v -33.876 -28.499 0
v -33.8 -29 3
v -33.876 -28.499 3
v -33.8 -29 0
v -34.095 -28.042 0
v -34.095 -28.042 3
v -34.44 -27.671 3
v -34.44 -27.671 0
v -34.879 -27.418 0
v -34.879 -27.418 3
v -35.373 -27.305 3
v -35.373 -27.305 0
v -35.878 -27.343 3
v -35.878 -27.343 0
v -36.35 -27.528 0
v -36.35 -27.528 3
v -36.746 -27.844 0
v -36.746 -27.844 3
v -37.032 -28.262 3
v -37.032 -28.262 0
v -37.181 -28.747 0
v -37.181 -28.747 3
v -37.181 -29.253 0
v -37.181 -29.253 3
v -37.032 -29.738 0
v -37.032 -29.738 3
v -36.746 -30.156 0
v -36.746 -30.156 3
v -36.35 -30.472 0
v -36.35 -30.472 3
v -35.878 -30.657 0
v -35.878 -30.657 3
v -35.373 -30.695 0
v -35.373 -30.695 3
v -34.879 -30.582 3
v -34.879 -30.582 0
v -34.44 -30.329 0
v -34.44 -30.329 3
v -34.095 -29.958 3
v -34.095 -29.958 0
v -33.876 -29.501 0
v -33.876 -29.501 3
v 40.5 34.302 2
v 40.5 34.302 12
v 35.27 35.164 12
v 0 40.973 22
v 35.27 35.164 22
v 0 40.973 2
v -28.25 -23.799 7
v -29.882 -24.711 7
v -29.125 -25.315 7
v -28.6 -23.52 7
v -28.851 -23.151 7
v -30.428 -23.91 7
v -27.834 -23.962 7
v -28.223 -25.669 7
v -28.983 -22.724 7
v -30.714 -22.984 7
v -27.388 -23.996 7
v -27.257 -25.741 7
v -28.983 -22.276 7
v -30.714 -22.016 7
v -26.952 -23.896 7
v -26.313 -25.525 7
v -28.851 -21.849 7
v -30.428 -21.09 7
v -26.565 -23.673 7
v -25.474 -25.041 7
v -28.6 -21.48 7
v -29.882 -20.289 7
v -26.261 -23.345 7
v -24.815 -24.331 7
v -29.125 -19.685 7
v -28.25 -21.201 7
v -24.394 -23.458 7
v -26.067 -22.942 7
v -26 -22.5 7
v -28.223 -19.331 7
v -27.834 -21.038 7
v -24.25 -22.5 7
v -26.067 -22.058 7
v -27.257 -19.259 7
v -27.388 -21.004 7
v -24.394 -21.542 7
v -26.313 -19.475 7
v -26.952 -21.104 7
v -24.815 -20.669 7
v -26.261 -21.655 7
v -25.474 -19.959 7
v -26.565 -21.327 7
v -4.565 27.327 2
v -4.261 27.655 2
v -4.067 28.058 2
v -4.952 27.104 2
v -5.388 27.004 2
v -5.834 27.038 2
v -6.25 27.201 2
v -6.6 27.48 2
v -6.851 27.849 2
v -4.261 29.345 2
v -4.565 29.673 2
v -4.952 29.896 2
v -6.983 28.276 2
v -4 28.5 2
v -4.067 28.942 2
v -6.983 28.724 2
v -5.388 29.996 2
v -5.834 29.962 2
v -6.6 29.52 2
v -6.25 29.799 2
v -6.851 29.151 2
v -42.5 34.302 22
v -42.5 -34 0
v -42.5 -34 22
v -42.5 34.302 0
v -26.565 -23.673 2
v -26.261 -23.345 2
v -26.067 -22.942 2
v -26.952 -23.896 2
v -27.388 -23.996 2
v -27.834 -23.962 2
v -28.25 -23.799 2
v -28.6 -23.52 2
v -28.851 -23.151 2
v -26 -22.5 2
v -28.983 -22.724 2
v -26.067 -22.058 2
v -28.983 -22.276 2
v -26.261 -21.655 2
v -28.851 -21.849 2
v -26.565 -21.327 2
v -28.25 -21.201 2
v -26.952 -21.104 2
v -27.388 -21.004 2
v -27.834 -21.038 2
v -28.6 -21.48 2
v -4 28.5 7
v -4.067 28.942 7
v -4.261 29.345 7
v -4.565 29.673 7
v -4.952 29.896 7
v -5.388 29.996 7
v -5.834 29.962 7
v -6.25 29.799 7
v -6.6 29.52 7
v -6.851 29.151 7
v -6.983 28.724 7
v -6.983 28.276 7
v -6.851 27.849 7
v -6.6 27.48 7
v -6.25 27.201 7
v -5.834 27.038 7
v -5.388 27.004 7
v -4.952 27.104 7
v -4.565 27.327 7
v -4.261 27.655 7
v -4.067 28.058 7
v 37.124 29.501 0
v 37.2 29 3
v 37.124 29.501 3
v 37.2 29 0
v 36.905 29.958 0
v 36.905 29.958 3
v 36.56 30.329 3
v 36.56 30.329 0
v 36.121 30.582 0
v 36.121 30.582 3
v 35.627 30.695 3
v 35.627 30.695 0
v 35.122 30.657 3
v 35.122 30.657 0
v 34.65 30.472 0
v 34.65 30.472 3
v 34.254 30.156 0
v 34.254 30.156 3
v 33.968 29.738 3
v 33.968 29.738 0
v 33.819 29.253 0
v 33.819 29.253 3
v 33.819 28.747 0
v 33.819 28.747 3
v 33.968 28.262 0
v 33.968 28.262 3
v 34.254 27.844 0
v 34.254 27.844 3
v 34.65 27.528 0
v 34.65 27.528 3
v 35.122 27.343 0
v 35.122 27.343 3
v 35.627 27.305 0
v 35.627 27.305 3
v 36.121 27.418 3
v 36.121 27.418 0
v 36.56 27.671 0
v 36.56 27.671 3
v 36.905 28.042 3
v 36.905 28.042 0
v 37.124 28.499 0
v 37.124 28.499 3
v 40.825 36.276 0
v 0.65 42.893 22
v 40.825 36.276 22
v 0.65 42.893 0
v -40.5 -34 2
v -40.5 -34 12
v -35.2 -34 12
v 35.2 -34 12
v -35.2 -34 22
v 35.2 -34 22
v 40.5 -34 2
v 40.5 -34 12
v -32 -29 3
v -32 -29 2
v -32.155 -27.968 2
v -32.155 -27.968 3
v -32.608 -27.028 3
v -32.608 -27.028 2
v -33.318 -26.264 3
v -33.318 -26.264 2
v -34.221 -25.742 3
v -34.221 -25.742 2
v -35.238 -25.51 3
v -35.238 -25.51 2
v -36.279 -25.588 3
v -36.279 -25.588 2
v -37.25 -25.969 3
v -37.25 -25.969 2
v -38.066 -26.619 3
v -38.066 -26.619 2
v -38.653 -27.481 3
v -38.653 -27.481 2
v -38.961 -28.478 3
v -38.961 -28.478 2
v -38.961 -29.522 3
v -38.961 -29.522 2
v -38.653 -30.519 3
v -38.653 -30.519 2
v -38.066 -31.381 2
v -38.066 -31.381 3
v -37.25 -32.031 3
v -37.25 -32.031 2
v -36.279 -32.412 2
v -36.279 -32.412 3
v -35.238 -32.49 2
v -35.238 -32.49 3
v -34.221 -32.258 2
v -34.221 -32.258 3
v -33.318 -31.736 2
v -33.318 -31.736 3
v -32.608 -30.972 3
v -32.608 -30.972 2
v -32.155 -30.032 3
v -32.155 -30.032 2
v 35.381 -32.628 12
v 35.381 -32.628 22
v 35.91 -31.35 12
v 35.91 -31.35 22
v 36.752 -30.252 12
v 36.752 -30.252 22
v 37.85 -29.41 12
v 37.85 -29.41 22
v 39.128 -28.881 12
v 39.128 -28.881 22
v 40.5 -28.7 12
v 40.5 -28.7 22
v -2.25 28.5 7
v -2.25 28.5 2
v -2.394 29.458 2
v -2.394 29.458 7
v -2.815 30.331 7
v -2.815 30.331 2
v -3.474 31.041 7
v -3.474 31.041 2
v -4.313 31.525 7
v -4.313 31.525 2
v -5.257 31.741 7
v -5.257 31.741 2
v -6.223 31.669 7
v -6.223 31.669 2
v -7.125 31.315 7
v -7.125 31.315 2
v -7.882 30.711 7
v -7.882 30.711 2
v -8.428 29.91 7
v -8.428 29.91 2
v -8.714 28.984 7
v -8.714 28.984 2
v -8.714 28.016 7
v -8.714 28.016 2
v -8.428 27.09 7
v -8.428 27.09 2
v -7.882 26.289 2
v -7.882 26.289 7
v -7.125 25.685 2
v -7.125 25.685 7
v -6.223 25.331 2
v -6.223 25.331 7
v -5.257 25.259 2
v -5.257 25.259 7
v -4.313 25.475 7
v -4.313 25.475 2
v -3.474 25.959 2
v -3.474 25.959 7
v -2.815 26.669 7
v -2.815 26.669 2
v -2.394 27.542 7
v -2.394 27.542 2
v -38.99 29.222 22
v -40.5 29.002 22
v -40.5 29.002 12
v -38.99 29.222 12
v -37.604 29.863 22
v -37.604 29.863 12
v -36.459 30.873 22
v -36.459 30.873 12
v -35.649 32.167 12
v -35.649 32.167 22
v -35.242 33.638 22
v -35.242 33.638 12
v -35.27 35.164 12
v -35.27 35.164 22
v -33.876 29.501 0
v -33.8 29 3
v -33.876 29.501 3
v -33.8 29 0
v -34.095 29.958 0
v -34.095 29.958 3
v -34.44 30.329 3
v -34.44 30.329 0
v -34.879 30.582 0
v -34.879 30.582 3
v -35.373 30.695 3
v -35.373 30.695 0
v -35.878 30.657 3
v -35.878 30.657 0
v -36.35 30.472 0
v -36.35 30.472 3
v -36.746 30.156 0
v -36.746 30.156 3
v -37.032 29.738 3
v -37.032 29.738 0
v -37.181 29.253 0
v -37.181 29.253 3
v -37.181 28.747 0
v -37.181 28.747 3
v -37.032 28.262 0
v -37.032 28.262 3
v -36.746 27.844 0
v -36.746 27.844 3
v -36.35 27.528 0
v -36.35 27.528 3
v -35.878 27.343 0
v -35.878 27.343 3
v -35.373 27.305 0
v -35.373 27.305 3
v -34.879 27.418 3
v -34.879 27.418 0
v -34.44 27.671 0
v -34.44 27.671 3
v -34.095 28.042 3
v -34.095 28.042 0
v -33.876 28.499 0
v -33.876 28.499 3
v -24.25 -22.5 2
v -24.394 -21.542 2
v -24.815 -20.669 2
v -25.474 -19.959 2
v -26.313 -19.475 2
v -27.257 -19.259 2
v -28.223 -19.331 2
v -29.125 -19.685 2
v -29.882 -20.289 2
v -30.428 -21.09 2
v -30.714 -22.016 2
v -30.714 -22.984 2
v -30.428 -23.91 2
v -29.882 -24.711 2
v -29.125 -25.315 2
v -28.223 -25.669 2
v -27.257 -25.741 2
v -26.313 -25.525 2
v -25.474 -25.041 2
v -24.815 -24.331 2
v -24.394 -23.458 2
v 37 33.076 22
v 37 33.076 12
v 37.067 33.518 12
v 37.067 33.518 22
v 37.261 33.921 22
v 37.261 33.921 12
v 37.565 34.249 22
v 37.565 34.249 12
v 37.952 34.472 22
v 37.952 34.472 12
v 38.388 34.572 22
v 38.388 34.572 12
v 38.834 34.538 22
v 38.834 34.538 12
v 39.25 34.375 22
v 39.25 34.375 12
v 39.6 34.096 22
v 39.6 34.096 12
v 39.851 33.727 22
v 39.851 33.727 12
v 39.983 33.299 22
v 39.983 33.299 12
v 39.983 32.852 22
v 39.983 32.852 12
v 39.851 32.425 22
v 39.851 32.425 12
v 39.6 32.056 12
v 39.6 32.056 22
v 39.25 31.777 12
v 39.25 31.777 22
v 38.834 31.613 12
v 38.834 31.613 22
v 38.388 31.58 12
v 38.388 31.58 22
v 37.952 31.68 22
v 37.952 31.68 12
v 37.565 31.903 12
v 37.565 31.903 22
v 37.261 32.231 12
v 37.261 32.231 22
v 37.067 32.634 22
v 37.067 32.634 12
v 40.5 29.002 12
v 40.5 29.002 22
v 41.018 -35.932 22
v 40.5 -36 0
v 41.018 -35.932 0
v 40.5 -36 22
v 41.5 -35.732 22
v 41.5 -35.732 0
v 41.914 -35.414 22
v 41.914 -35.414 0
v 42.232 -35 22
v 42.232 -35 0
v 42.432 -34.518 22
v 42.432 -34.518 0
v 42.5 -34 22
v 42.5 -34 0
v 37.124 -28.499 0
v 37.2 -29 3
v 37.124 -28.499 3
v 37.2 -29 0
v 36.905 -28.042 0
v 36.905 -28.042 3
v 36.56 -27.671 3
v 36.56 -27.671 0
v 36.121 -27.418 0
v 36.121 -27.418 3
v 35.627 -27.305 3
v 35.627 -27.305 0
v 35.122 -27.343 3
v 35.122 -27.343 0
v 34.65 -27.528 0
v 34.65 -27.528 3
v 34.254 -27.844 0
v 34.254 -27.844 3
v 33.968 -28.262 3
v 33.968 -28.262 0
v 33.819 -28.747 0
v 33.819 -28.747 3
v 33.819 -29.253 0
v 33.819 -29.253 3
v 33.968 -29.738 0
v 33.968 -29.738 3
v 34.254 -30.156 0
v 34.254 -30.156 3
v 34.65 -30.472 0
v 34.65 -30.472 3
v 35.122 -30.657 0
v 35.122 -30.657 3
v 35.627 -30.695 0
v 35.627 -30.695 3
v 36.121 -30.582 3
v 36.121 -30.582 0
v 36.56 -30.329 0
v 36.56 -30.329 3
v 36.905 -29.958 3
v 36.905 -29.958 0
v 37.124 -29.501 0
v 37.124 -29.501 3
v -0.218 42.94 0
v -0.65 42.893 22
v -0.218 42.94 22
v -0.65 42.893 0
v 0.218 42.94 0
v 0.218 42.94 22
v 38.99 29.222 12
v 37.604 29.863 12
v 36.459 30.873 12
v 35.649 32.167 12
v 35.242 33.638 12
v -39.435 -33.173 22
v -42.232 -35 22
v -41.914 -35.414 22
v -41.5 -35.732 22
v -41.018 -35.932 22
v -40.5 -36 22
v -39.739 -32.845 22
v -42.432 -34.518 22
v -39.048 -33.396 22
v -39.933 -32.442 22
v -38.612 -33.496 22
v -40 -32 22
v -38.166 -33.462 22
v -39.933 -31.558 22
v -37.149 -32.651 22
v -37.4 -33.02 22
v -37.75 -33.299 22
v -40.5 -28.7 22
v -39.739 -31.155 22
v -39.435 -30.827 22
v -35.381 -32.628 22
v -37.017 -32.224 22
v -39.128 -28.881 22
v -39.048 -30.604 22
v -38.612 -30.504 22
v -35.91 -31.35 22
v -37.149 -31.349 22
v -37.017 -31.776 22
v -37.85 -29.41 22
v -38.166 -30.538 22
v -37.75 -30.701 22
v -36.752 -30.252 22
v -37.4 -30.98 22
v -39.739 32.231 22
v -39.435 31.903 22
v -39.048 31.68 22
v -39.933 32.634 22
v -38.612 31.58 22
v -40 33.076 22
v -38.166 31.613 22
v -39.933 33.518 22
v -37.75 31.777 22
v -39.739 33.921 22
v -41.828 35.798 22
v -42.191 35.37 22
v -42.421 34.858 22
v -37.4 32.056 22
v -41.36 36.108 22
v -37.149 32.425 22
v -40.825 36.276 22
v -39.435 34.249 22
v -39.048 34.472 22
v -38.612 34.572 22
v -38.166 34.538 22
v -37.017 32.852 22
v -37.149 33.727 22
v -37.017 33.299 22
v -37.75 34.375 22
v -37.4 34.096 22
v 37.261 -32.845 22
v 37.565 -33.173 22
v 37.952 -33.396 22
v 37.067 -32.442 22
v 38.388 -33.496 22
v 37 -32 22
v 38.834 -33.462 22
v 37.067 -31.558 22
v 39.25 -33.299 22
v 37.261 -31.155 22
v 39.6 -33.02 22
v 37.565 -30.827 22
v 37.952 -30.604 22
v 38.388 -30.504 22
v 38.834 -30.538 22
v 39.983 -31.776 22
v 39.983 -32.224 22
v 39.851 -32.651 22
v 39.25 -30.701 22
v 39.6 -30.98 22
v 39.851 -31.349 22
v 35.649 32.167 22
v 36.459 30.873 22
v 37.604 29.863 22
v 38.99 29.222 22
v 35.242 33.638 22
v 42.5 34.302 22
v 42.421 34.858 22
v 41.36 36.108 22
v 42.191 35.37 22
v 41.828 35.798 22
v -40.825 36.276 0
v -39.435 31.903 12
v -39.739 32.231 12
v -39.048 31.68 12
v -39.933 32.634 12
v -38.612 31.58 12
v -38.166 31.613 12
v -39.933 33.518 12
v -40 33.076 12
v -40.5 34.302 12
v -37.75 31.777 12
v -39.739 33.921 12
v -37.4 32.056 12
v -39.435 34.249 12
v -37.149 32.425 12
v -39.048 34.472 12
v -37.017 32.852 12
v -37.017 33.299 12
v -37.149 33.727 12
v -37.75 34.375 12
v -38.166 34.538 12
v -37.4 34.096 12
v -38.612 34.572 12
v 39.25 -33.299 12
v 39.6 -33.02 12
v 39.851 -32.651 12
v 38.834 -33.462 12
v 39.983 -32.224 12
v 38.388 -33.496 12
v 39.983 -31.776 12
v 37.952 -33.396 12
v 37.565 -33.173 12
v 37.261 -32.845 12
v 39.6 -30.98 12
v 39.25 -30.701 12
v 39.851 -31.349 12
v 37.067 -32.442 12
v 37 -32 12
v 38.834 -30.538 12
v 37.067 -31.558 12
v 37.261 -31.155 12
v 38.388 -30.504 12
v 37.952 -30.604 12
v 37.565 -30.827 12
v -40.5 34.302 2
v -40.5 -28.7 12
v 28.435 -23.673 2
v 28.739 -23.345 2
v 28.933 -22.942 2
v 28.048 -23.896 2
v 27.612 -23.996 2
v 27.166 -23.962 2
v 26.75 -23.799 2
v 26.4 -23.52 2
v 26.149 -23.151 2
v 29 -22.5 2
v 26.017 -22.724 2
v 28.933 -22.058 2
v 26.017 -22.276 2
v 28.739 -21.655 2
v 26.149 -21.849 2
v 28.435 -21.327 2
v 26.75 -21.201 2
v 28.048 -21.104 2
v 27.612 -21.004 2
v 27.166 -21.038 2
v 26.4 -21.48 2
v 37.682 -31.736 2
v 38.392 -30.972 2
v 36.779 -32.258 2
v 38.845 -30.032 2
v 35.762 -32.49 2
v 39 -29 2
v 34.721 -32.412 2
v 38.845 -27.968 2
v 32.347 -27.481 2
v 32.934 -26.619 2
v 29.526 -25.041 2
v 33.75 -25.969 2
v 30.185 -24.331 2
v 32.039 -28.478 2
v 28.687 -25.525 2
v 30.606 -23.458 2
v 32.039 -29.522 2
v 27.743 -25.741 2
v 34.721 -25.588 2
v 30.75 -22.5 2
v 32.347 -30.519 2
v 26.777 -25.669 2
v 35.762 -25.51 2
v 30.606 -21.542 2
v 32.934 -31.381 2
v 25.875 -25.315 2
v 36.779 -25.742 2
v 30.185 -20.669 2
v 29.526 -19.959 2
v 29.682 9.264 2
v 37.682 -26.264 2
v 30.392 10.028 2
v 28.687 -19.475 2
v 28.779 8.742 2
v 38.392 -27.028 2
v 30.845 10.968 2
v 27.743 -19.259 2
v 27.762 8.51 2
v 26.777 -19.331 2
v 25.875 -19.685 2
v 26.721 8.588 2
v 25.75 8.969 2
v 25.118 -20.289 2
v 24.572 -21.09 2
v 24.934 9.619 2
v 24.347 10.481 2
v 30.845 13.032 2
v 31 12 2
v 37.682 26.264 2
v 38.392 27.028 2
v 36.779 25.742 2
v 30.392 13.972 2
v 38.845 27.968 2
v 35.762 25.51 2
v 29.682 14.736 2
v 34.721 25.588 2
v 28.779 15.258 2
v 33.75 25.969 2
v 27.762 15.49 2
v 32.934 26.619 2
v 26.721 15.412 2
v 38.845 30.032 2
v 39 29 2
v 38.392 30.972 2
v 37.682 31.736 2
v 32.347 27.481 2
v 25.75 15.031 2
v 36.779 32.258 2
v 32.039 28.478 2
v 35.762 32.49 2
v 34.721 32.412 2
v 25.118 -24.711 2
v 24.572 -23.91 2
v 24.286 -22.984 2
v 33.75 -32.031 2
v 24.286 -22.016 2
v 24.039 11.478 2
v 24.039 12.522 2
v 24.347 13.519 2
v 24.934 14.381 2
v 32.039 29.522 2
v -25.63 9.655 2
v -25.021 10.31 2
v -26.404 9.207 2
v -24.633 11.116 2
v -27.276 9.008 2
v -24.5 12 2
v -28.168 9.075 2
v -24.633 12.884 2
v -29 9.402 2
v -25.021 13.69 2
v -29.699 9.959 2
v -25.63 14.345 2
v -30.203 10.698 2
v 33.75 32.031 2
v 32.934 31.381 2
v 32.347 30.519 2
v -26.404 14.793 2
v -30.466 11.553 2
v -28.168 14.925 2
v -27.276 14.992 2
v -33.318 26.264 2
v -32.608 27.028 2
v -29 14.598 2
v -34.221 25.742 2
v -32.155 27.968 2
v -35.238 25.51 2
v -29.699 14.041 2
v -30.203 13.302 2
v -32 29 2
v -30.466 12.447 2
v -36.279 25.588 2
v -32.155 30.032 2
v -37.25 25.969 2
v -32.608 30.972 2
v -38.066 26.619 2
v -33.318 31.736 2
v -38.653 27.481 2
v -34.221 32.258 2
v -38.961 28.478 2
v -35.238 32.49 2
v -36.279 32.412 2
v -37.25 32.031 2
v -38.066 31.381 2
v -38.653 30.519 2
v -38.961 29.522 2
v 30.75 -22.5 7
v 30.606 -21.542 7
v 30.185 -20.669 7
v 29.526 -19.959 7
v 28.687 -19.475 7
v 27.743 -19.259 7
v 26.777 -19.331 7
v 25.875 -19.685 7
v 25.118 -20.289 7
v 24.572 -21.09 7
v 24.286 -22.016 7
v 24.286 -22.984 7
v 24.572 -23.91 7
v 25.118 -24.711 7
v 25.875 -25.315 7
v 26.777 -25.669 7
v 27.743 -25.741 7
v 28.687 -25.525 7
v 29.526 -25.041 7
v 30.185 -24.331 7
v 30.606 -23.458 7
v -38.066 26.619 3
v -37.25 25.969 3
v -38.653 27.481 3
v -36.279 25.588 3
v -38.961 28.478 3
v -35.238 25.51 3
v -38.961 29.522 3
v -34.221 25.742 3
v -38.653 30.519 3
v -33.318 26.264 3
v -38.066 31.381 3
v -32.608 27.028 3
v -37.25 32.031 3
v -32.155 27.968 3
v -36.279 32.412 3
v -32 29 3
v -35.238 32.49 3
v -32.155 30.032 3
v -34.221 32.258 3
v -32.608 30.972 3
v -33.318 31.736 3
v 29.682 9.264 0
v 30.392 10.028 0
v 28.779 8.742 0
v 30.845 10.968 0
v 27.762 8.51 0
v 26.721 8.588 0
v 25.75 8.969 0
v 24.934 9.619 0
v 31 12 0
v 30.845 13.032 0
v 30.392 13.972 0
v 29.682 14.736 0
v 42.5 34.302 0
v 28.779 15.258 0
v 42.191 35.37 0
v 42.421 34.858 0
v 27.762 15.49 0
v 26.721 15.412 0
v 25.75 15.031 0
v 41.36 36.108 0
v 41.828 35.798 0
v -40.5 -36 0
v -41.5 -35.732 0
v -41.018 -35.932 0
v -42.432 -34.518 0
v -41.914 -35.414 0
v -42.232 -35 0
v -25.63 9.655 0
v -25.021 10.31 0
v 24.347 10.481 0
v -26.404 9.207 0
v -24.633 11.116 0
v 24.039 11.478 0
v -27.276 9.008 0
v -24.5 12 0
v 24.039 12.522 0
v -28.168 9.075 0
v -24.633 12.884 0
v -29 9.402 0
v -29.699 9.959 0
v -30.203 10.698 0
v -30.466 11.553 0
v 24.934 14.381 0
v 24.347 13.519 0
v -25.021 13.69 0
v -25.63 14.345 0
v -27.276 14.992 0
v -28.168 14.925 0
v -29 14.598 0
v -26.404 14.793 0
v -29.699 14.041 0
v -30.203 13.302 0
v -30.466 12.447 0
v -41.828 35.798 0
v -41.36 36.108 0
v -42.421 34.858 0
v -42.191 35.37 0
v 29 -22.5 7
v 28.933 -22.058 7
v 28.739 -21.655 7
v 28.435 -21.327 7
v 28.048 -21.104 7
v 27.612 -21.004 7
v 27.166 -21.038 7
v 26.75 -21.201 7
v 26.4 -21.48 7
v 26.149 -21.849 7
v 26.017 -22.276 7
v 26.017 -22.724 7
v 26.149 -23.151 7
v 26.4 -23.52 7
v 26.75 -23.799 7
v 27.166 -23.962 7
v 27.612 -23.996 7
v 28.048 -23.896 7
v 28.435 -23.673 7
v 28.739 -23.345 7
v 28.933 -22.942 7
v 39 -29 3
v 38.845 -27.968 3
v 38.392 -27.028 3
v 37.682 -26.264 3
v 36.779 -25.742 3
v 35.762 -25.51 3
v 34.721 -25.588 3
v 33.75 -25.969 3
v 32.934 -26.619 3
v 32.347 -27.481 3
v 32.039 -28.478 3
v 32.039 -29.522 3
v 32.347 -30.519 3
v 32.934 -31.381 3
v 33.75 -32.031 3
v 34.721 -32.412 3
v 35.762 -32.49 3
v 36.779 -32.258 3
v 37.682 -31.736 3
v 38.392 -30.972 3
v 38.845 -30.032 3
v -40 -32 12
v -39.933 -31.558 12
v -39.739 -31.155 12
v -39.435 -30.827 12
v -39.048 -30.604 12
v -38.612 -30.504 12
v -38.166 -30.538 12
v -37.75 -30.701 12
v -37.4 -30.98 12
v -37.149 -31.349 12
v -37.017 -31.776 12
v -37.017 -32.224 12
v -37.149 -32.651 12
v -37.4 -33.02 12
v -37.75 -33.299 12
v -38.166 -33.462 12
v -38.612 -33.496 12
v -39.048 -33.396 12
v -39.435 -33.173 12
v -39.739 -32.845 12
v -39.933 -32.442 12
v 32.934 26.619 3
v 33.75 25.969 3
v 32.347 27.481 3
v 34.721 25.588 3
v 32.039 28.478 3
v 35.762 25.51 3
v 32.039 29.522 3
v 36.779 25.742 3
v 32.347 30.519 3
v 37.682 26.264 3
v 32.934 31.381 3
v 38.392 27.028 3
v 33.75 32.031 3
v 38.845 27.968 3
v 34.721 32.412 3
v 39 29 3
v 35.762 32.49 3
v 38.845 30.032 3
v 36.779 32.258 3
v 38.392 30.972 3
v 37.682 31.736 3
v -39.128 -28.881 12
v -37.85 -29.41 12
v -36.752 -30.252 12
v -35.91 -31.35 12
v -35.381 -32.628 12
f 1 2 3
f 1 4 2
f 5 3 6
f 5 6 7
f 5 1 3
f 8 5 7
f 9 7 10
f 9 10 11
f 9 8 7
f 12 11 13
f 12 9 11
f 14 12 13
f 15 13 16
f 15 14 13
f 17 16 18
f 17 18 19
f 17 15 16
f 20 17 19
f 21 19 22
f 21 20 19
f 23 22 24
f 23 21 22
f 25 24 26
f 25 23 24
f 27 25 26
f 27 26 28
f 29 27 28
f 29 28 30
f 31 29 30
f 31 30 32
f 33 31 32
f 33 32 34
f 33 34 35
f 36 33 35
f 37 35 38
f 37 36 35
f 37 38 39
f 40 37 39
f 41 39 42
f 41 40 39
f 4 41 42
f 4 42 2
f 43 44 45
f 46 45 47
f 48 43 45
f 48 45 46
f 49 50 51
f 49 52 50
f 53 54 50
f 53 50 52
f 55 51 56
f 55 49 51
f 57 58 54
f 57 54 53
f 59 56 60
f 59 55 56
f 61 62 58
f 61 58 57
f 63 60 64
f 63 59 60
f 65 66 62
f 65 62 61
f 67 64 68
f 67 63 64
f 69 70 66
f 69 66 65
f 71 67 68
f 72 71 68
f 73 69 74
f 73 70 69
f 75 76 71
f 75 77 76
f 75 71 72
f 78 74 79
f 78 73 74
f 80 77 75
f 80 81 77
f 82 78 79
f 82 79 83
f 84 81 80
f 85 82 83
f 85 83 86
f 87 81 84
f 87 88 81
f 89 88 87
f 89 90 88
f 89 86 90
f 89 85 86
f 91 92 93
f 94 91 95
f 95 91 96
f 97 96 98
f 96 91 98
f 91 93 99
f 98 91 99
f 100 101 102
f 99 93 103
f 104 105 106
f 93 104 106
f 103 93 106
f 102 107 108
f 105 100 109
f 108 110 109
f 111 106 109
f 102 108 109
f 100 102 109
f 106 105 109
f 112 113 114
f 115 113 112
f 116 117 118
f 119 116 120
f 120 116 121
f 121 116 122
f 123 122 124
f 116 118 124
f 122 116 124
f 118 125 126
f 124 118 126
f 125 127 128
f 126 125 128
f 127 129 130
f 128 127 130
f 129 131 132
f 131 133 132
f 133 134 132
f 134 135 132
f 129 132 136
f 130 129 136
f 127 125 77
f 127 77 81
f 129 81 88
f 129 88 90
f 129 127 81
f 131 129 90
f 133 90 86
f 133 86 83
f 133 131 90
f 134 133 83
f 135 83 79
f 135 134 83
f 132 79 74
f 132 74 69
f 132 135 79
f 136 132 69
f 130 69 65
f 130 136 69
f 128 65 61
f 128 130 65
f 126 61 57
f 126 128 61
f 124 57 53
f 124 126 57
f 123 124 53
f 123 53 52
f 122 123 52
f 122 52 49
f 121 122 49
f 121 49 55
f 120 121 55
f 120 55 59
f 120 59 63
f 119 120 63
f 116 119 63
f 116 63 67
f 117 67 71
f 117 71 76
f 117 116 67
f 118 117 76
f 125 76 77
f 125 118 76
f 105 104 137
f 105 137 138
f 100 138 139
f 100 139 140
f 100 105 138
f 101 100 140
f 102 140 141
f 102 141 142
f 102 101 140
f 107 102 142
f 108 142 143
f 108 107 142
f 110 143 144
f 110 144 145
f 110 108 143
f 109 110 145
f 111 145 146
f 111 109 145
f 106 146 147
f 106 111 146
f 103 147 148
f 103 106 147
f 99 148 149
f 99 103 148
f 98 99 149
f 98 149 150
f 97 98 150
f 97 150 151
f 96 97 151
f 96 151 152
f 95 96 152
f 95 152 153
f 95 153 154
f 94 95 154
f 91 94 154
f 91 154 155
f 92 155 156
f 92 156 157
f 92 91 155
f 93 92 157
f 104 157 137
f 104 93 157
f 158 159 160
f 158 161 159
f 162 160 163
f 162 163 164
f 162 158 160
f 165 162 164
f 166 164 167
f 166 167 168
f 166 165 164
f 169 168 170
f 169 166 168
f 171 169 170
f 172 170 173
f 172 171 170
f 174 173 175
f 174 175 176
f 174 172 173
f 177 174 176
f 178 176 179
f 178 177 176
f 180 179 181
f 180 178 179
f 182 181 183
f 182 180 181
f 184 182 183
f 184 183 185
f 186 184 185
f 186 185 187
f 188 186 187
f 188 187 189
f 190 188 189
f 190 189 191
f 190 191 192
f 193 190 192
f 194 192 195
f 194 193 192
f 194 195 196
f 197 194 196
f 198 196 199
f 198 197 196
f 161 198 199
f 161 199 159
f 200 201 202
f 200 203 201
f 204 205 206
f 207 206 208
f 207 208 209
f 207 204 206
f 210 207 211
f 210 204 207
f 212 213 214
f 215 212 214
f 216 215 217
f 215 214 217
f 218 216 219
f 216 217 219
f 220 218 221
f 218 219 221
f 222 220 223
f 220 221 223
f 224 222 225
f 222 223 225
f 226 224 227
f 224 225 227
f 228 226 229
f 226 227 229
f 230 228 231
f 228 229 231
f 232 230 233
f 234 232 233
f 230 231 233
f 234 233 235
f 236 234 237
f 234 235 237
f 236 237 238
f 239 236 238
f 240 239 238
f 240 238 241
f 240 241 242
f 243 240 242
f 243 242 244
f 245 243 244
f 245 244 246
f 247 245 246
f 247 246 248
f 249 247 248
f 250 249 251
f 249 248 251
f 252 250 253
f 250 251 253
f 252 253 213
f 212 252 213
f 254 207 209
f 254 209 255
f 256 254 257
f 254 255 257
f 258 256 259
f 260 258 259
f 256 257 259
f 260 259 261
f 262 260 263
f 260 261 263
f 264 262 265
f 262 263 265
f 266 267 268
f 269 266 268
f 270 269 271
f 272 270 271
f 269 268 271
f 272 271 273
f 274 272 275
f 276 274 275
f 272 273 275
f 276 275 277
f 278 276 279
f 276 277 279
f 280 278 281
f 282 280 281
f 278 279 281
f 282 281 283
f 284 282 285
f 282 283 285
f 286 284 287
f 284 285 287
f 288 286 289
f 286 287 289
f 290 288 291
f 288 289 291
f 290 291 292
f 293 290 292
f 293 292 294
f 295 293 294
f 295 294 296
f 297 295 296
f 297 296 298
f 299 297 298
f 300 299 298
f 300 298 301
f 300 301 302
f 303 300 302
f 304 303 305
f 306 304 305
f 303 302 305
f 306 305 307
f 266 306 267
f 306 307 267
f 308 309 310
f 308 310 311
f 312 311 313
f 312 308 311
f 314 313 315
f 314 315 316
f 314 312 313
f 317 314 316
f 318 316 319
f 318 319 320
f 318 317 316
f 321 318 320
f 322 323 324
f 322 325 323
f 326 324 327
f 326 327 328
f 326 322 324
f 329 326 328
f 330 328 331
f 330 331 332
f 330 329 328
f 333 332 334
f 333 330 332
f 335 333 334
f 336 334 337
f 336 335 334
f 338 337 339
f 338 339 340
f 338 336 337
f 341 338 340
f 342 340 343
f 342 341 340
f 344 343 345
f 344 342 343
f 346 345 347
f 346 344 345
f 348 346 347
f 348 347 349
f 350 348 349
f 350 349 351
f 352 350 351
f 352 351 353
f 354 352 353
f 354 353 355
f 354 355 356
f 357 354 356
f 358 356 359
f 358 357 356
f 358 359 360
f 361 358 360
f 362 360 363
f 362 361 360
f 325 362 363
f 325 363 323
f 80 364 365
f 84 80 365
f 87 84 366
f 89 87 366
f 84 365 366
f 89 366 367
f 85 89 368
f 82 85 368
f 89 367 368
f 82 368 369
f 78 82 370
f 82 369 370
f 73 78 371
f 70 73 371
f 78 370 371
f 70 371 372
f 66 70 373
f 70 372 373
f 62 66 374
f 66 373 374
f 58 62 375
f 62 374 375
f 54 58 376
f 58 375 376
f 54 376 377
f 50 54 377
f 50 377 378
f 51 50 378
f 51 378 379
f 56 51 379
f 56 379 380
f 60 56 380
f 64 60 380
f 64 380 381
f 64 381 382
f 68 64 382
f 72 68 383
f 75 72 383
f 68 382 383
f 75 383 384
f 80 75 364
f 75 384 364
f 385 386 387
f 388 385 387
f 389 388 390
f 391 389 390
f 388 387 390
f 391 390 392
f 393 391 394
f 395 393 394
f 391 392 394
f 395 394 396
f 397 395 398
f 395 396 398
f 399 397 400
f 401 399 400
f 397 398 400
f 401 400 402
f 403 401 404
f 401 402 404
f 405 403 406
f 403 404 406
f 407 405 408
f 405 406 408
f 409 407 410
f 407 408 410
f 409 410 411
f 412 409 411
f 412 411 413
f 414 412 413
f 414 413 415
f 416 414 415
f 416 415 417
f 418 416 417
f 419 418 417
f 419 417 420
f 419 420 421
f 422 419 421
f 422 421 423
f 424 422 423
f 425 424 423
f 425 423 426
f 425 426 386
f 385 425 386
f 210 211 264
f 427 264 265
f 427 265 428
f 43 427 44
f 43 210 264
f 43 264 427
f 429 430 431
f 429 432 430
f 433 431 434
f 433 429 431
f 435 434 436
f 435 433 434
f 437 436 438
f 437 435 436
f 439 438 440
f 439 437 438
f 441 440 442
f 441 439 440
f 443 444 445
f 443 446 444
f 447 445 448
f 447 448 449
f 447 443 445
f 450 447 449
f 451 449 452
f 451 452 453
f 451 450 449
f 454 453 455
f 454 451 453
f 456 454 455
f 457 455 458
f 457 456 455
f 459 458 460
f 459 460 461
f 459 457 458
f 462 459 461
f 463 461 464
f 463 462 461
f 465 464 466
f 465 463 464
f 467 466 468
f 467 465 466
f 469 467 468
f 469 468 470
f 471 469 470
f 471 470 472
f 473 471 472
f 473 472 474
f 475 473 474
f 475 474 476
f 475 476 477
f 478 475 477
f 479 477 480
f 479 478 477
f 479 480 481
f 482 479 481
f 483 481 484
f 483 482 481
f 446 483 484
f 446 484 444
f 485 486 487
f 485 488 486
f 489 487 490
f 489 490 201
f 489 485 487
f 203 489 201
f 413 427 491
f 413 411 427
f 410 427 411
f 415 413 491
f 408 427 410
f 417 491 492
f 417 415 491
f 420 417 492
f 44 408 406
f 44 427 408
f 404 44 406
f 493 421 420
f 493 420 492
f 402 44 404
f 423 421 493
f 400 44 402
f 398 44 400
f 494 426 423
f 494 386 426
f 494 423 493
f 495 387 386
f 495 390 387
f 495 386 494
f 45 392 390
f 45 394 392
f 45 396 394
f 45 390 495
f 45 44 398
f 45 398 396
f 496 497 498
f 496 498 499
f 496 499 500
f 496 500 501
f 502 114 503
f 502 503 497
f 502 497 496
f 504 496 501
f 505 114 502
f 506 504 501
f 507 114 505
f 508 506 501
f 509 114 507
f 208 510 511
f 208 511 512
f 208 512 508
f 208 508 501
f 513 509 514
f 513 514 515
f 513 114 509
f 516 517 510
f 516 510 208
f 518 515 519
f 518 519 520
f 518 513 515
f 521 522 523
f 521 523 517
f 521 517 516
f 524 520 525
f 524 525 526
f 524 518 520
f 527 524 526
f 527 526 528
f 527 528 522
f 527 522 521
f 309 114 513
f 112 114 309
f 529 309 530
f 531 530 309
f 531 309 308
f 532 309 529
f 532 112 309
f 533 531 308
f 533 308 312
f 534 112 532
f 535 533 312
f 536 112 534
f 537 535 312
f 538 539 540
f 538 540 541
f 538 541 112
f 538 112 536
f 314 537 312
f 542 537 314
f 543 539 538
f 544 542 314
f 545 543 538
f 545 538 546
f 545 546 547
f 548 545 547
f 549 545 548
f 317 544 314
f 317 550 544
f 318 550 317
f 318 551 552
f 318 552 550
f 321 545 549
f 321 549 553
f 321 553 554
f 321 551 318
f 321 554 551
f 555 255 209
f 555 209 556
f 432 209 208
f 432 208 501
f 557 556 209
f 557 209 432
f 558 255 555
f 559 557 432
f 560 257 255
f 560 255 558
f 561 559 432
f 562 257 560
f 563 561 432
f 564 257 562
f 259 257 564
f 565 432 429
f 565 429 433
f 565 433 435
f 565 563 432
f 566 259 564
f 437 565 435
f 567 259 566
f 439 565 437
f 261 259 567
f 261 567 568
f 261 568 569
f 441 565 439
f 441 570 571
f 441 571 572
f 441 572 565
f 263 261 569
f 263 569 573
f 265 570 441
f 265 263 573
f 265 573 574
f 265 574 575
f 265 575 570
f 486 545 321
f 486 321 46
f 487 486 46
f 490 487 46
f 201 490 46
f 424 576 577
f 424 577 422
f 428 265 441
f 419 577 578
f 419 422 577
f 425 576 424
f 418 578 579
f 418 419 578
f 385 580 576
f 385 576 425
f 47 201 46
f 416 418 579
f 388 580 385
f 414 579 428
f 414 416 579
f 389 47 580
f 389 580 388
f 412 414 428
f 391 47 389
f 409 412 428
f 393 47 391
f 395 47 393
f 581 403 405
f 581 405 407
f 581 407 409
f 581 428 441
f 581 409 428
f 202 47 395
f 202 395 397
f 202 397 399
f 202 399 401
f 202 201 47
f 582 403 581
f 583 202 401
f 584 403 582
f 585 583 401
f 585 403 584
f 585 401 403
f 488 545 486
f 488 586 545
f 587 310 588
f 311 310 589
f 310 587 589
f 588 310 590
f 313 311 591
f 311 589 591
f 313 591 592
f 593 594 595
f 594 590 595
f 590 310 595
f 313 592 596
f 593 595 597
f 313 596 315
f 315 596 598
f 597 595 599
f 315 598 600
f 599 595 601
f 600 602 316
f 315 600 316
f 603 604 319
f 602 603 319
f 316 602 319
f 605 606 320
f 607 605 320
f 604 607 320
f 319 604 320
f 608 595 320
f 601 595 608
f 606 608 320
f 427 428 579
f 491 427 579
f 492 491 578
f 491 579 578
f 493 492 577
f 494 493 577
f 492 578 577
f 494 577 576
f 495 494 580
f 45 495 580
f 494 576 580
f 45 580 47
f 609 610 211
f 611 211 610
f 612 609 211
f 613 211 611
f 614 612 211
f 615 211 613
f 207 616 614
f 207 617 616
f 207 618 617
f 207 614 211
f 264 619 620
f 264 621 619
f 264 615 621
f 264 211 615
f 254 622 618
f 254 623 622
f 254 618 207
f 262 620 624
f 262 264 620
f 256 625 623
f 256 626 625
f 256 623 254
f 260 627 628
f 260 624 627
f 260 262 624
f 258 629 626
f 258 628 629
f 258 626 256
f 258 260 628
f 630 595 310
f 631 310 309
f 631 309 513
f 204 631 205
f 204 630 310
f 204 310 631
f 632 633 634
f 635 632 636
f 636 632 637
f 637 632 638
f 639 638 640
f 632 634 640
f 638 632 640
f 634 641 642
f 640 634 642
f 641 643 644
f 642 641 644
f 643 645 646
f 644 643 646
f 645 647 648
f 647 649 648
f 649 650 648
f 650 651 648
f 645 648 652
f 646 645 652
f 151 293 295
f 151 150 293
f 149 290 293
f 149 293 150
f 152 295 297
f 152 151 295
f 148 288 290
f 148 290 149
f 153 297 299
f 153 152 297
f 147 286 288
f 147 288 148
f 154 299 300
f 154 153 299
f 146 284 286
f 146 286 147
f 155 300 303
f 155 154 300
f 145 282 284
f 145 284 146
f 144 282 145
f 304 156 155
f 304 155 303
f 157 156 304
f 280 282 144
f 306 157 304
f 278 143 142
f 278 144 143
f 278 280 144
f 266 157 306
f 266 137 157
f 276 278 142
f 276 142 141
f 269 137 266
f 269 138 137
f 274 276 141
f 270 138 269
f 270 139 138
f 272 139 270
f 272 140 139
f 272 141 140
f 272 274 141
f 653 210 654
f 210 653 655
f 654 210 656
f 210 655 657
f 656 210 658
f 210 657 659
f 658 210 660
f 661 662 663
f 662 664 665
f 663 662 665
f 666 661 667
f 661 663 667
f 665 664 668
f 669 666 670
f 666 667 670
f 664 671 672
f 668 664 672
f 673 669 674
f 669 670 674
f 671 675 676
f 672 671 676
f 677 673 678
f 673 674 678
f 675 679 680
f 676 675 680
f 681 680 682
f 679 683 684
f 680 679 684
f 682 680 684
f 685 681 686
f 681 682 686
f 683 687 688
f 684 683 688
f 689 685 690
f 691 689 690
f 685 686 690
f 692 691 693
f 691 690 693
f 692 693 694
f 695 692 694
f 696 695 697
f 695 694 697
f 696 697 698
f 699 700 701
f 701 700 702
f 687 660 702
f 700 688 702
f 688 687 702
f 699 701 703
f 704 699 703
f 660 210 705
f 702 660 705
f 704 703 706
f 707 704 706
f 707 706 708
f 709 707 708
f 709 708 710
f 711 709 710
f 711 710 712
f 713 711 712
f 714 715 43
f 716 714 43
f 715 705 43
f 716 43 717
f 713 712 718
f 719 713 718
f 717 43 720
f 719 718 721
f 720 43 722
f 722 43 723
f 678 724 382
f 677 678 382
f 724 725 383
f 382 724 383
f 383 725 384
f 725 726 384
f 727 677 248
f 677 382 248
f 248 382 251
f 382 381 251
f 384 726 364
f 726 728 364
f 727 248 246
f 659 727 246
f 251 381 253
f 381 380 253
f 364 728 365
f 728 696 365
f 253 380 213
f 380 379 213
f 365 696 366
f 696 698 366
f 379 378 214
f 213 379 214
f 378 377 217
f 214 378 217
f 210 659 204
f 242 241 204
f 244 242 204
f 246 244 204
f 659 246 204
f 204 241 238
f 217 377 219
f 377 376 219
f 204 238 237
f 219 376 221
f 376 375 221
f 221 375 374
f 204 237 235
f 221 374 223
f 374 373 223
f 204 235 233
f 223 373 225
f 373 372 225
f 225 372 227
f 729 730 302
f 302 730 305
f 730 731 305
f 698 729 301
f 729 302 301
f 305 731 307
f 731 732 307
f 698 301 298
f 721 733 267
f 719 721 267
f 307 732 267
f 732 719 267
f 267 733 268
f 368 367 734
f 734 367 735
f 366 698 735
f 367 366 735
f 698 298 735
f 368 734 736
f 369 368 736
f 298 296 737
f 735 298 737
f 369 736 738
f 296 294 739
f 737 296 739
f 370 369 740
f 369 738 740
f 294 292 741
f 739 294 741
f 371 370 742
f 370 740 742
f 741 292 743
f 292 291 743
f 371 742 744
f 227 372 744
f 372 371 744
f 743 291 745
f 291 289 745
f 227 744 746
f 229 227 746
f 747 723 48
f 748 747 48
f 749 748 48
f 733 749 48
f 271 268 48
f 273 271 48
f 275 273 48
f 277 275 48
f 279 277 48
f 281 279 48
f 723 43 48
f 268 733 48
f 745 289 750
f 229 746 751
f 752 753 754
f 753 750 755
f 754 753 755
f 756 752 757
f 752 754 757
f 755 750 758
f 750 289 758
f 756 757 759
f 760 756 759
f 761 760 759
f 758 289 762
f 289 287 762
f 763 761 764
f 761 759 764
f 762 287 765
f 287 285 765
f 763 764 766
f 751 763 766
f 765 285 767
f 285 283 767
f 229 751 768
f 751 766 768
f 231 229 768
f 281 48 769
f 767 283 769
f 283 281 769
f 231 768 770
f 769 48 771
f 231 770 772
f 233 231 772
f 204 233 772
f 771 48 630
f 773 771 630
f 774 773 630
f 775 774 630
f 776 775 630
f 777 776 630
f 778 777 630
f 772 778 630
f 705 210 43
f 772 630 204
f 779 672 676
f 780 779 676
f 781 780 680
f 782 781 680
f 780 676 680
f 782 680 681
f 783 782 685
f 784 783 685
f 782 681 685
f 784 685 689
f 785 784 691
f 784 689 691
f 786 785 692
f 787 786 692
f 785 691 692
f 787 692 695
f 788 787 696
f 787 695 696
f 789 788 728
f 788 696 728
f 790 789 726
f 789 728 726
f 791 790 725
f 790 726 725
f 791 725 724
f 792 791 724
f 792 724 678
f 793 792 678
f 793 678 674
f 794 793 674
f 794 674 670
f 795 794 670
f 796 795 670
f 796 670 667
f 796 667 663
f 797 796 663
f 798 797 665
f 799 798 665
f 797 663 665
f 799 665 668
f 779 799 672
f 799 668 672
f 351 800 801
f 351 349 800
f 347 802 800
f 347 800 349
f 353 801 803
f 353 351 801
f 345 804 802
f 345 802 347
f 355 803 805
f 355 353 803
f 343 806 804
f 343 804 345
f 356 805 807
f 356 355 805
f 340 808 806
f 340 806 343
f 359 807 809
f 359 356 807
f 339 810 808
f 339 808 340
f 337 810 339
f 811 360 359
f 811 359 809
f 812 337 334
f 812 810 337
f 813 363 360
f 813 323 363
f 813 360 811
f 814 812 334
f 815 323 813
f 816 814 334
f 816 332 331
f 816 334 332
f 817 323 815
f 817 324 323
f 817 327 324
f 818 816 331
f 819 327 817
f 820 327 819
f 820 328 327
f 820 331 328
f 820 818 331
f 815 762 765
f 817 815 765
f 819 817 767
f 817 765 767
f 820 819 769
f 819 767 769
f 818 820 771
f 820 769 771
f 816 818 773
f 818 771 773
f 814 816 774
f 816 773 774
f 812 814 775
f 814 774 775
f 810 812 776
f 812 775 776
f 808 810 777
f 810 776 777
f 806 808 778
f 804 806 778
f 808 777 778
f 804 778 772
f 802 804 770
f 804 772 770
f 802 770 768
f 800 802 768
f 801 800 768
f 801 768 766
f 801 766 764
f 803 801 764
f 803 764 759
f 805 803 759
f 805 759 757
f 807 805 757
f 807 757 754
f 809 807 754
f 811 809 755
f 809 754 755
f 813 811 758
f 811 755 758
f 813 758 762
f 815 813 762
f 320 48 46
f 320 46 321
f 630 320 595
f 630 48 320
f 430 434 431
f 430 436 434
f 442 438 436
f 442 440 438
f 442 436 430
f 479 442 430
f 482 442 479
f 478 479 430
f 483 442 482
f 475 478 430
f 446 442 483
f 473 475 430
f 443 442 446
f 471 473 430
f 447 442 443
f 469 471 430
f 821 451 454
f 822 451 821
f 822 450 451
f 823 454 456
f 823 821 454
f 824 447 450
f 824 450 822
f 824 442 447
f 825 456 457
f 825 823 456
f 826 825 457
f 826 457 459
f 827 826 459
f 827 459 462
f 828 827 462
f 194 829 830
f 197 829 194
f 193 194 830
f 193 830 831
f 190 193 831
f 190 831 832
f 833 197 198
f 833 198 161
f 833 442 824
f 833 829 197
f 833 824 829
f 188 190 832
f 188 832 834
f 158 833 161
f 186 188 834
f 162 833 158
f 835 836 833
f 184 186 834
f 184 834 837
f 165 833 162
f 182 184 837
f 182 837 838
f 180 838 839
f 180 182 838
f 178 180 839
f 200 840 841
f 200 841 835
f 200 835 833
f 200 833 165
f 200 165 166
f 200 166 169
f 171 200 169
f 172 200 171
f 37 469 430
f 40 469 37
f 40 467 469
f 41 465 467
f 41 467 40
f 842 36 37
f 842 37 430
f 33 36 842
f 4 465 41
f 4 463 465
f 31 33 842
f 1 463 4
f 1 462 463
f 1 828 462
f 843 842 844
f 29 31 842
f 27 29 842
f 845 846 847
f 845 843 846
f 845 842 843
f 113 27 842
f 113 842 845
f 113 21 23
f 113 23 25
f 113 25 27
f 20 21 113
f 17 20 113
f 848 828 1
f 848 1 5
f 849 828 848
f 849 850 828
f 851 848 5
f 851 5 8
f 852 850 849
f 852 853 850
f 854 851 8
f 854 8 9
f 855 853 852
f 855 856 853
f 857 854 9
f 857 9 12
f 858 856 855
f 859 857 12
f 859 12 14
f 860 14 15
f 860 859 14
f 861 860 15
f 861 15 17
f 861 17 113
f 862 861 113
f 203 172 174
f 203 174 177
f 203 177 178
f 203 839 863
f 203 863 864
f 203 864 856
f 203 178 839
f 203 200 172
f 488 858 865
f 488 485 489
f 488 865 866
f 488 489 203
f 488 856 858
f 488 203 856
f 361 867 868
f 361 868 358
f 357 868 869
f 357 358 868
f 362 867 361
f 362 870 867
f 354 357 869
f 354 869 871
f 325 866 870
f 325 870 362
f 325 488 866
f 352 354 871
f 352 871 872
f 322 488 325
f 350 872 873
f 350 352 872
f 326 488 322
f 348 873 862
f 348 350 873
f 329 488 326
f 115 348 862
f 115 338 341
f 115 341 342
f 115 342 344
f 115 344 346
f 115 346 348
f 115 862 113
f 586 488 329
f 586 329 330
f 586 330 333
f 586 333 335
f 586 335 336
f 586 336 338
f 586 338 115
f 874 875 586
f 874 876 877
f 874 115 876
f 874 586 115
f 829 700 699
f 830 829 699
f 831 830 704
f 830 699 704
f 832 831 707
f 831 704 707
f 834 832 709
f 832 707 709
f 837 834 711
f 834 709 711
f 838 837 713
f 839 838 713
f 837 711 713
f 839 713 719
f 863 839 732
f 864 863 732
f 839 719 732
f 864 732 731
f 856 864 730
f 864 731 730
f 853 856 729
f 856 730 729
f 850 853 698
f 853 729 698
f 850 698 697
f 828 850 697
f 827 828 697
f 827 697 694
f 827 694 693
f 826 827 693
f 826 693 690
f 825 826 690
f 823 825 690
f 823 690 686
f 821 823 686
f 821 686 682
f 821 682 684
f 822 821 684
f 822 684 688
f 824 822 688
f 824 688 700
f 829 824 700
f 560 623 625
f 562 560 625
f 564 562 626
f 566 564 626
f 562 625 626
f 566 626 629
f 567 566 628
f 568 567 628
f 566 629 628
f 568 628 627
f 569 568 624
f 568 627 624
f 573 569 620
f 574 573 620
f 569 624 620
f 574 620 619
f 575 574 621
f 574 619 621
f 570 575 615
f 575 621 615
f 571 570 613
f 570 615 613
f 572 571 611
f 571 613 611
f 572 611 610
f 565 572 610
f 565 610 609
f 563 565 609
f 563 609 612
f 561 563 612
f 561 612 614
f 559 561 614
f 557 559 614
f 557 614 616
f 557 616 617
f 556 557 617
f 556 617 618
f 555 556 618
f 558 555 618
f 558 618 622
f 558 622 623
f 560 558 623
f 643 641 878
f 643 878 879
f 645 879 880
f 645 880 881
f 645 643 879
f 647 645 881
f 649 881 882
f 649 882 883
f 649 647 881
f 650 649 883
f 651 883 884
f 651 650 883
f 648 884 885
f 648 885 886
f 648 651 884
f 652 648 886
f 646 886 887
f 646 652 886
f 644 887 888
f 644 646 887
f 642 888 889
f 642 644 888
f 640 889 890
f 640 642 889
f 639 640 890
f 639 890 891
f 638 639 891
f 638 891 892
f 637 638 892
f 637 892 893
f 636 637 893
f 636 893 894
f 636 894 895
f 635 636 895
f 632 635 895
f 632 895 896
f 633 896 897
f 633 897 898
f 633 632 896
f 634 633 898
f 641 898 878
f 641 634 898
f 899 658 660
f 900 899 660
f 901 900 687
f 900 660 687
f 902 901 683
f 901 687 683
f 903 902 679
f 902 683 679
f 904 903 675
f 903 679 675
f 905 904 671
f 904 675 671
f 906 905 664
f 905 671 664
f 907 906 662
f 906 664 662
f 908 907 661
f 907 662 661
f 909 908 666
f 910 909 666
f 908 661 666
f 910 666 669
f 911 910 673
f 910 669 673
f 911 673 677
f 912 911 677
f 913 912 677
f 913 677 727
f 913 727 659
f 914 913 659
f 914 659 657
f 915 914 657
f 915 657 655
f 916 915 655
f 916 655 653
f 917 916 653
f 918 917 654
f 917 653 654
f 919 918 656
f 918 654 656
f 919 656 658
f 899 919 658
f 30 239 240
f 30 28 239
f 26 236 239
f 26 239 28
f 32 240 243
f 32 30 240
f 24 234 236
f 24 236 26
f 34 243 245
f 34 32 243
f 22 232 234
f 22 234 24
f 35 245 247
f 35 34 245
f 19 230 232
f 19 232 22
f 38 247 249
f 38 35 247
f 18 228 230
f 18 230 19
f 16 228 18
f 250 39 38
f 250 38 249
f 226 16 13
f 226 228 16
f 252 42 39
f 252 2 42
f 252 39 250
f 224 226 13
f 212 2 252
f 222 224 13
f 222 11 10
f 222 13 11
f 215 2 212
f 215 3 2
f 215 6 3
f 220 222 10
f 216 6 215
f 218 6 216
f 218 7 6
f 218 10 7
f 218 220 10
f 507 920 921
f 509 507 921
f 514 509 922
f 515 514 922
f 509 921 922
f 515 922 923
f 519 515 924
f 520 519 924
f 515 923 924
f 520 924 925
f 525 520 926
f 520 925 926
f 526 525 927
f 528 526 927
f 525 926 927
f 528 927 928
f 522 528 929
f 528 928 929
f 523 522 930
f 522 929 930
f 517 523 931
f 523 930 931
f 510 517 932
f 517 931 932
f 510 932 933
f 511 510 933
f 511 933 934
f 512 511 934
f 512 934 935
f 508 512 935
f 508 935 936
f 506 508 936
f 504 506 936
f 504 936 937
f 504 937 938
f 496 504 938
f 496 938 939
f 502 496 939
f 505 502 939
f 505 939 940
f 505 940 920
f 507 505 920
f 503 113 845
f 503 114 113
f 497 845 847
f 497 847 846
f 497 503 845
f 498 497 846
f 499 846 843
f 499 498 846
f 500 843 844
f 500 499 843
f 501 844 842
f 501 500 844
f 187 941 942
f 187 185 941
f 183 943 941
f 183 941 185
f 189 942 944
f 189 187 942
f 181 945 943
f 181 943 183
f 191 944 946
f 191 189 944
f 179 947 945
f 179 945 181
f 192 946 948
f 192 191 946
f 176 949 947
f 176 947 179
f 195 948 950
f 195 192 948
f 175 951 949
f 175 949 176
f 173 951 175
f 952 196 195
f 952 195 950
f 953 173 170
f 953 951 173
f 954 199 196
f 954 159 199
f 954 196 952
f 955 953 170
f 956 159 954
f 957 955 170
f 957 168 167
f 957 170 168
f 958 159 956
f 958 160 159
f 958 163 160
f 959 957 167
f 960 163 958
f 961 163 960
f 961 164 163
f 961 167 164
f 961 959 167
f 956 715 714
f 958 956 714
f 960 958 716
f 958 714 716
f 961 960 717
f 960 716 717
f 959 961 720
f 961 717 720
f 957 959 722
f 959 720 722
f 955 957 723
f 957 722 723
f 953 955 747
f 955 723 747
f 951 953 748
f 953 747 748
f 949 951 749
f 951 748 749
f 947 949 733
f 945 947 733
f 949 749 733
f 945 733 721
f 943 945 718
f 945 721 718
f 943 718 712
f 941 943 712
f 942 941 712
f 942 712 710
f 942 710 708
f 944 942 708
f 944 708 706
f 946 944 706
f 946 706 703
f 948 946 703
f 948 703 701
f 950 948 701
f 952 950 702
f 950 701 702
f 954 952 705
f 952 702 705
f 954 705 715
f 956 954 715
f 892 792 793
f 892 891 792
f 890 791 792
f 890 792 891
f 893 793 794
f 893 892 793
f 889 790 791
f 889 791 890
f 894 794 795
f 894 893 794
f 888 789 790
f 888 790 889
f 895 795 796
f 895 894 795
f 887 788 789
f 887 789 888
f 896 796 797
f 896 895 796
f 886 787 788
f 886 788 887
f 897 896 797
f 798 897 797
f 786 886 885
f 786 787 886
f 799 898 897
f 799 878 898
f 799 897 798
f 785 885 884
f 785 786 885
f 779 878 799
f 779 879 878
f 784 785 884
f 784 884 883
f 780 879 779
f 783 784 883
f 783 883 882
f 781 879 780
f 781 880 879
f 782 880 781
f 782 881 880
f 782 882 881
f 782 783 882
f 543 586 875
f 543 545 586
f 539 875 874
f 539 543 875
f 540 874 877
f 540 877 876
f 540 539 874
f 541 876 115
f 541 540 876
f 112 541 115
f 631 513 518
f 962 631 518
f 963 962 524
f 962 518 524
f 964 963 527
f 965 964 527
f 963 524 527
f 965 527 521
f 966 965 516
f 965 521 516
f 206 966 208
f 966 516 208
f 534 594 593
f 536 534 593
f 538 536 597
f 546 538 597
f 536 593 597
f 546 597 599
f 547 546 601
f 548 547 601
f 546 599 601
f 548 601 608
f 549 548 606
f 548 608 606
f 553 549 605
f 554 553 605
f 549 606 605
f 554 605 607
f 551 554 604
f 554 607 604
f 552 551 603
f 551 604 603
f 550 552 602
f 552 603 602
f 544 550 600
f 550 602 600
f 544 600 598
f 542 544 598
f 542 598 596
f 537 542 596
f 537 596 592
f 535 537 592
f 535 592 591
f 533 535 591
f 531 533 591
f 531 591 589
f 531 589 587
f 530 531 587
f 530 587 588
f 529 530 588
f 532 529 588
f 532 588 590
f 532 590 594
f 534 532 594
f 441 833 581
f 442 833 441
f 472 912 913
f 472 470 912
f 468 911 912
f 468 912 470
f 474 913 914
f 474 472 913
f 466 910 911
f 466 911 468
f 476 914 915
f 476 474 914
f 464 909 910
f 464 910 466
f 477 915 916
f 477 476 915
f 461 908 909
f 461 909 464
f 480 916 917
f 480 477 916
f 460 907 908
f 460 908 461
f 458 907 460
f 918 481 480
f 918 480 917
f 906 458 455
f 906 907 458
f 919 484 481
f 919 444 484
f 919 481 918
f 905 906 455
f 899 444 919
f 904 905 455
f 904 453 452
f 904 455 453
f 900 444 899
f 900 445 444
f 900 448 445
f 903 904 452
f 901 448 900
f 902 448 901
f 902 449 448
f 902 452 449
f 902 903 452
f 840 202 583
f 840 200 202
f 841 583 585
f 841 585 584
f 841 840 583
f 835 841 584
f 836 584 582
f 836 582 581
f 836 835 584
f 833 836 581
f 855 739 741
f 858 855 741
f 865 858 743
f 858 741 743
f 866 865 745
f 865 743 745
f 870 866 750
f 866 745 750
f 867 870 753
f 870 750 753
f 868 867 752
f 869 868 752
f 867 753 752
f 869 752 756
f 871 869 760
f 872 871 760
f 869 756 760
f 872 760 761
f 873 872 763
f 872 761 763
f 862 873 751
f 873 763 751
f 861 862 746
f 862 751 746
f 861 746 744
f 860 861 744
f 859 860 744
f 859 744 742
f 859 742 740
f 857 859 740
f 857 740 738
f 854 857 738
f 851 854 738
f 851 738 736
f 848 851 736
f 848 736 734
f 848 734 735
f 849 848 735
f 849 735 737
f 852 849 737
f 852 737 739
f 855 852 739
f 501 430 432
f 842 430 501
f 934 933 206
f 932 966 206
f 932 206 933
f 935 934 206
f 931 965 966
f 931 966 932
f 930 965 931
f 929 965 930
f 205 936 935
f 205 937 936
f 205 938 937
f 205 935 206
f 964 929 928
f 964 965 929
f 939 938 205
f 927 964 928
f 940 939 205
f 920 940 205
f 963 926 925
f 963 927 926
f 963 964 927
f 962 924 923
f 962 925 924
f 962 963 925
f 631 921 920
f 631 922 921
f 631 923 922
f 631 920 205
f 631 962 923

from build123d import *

# Parameters (mm, degrees)
SCHIZZO6_R                       = 1.7
ESTRUSIONE_ESTRUSIONE1_DEPTH     = 2
ESTRUSIONE_ESTRUSIONE2_DEPTH     = 20
SCHIZZO9_R                       = 3.5
SCHIZZO9_R_2                     = 1.7
ESTRUSIONE_FORI_CHASSIS_DEPTH    = 1
SCHIZZO10_R                      = 3.25
SCHIZZO10_R_2                    = 1.5
ESTRUSIONE_FORI_PCB_DEPTH        = 5
RACCORDO1_R                      = 4
RACCORDO2_R                      = 2
RACCORDO3_R                      = 2
RACCORDO4_R                      = 2
RACCORDO5_R                      = 2
ESTRUSIONE_ESTRUSIONE3_DEPTH     = 10
FORO_PER_VITE_M2_1_D             = 3
FORO_PER_VITE_M2_1_DEPTH         = 10
TAGLIO_FORI_PASSAGGIO_CAVI_REACH = 65.644
SCHIZZO15_R                      = 3.5
SCHIZZO15_R_2                    = 3


with BuildPart() as part:
    # Schizzo6 → Estrusione-Estrusione1 (new body)
    with BuildSketch(Plane.XY):
        Polygon((-42.5, 36), (0, 43), (42.5, 36), (42.5, -36), (-42.5, -36), align=None)
        with Locations((-35.5, 29)):
            Circle(SCHIZZO6_R, mode=Mode.SUBTRACT)
        with Locations((35.5, 29)):
            Circle(SCHIZZO6_R, mode=Mode.SUBTRACT)
        with Locations((35.5, -29)):
            Circle(SCHIZZO6_R, mode=Mode.SUBTRACT)
        with Locations((-35.5, -29)):
            Circle(SCHIZZO6_R, mode=Mode.SUBTRACT)
    extrude(amount=ESTRUSIONE_ESTRUSIONE1_DEPTH)

    # Schizzo8 → Estrusione-Estrusione2 (add)
    with BuildSketch(Plane.XY.offset(2)):
        Polygon((-42.5, 36), (0, 43), (42.5, 36), (42.5, -36), (-42.5, -36), align=None)
        Polygon((-40.5, 34.302465265), (-40.5, -34), (40.5, -34), (40.5, 34.302465265), (0, 40.973053501), align=None, mode=Mode.SUBTRACT)
    extrude(amount=ESTRUSIONE_ESTRUSIONE2_DEPTH)

    # Schizzo9 → Estrusione-Fori Chassis (add)
    # profile 1 of 4: a face of its own
    with BuildSketch(Plane.XY.offset(2)):
        with Locations((-35.5, 29)):
            Circle(SCHIZZO9_R)
        with Locations((-35.5, 29)):
            Circle(SCHIZZO9_R_2, mode=Mode.SUBTRACT)
    # profile 2 of 4: a face of its own
    with BuildSketch(Plane.XY.offset(2)):
        with Locations((-35.5, -29)):
            Circle(SCHIZZO9_R)
        with Locations((-35.5, -29)):
            Circle(SCHIZZO9_R_2, mode=Mode.SUBTRACT)
    # profile 3 of 4: a face of its own
    with BuildSketch(Plane.XY.offset(2)):
        with Locations((35.5, -29)):
            Circle(SCHIZZO9_R)
        with Locations((35.5, -29)):
            Circle(SCHIZZO9_R_2, mode=Mode.SUBTRACT)
    # profile 4 of 4: a face of its own
    with BuildSketch(Plane.XY.offset(2)):
        with Locations((35.5, 29)):
            Circle(SCHIZZO9_R)
        with Locations((35.5, 29)):
            Circle(SCHIZZO9_R_2, mode=Mode.SUBTRACT)
    extrude(amount=ESTRUSIONE_FORI_CHASSIS_DEPTH)

    # Schizzo10 → Estrusione-Fori PCB (add)
    # profile 1 of 3: a face of its own
    with BuildSketch(Plane.XY.offset(2)):
        with Locations((-27.5, -22.5)):
            Circle(SCHIZZO10_R)
        with Locations((-27.5, -22.5)):
            Circle(SCHIZZO10_R_2, mode=Mode.SUBTRACT)
    # profile 2 of 3: a face of its own
    with BuildSketch(Plane.XY.offset(2)):
        with Locations((-5.5, 28.5)):
            Circle(SCHIZZO10_R)
        with Locations((-5.5, 28.5)):
            Circle(SCHIZZO10_R_2, mode=Mode.SUBTRACT)
    # profile 3 of 3: a face of its own
    with BuildSketch(Plane.XY.offset(2)):
        with Locations((27.5, -22.5)):
            Circle(SCHIZZO10_R)
        with Locations((27.5, -22.5)):
            Circle(SCHIZZO10_R_2, mode=Mode.SUBTRACT)
    extrude(amount=ESTRUSIONE_FORI_PCB_DEPTH)

    # Raccordo1
    raccordo1_edges = [part.edges().sort_by_distance(p)[0] for p in [
        (0, 43, 11),
    ]]
    fillet(raccordo1_edges, radius=RACCORDO1_R)

    # Raccordo2
    raccordo2_edges = [part.edges().sort_by_distance(p)[0] for p in [
        (42.5, 36, 11),
    ]]
    fillet(raccordo2_edges, radius=RACCORDO2_R)

    # Raccordo3
    raccordo3_edges = [part.edges().sort_by_distance(p)[0] for p in [
        (-42.5, 36, 11),
    ]]
    fillet(raccordo3_edges, radius=RACCORDO3_R)

    # Raccordo4
    raccordo4_edges = [part.edges().sort_by_distance(p)[0] for p in [
        (-42.5, -36, 11),
    ]]
    fillet(raccordo4_edges, radius=RACCORDO4_R)

    # Raccordo5
    raccordo5_edges = [part.edges().sort_by_distance(p)[0] for p in [
        (42.5, -36, 11),
    ]]
    fillet(raccordo5_edges, radius=RACCORDO5_R)

    # Schizzo11 → Estrusione-Estrusione3 (add)
    with BuildSketch(Plane.XY.offset(22)):
        with BuildLine():
            Line((-35.270458912, 35.163801445), (-40.5, 34.302465265))
            Line((-40.5, 34.302465265), (-40.5, 29.002465265))
            ThreePointArc((-40.5, 29.002465265), (-36.45926481, 30.872821097), (-35.270458912, 35.163801445))
        make_face()
        with BuildLine():
            Line((-35.2, -34), (-40.5, -34))
            Line((-40.5, -34), (-40.5, -28.7))
            ThreePointArc((-40.5, -28.7), (-36.75233406, -30.25233406), (-35.2, -34))
        make_face()
        with BuildLine():
            Line((40.5, -28.7), (40.5, -34))
            Line((40.5, -34), (35.2, -34))
            ThreePointArc((35.2, -34), (36.75233406, -30.25233406), (40.5, -28.7))
        make_face()
        with BuildLine():
            Line((35.270458912, 35.163801445), (40.5, 34.302465265))
            Line((40.5, 34.302465265), (40.5, 29.002465265))
            ThreePointArc((40.5, 29.002465265), (36.45926481, 30.872821097), (35.270458912, 35.163801445))
        make_face()
    extrude(amount=-ESTRUSIONE_ESTRUSIONE3_DEPTH)

    # Foro per Vite M2-1
    with Locations(Plane.XY.offset(22)):
        with Locations((-38.5, 33.075876997), (-38.5, -32), (38.5, -32), (38.5, 33.075876997)):
            Hole(FORO_PER_VITE_M2_1_D / 2, depth=FORO_PER_VITE_M2_1_DEPTH)

    # Schizzo15 → Taglio-Fori Passaggio Cavi (cut, up to next)
    with BuildSketch(Plane.XY.offset(2), mode=Mode.PRIVATE) as taglio_fori_passaggio_cavi_sk1:
        with Locations((27.5, 12)):
            Circle(SCHIZZO15_R)
    taglio_fori_passaggio_cavi_tool1 = extrude(taglio_fori_passaggio_cavi_sk1.sketch, amount=-TAGLIO_FORI_PASSAGGIO_CAVI_REACH, mode=Mode.PRIVATE) & part.part
    # Schizzo15 → Taglio-Fori Passaggio Cavi (cut, up to next)
    with BuildSketch(Plane.XY.offset(2), mode=Mode.PRIVATE) as taglio_fori_passaggio_cavi_sk2:
        with Locations((-27.5, 12)):
            Circle(SCHIZZO15_R_2)
    taglio_fori_passaggio_cavi_tool2 = extrude(taglio_fori_passaggio_cavi_sk2.sketch, amount=-TAGLIO_FORI_PASSAGGIO_CAVI_REACH, mode=Mode.PRIVATE) & part.part
    add(taglio_fori_passaggio_cavi_tool1.solids().sort_by_distance((27.5, 12, 2))[0], mode=Mode.SUBTRACT)
    add(taglio_fori_passaggio_cavi_tool2.solids().sort_by_distance((-27.5, 12, 2))[0], mode=Mode.SUBTRACT)


solid = part.part
